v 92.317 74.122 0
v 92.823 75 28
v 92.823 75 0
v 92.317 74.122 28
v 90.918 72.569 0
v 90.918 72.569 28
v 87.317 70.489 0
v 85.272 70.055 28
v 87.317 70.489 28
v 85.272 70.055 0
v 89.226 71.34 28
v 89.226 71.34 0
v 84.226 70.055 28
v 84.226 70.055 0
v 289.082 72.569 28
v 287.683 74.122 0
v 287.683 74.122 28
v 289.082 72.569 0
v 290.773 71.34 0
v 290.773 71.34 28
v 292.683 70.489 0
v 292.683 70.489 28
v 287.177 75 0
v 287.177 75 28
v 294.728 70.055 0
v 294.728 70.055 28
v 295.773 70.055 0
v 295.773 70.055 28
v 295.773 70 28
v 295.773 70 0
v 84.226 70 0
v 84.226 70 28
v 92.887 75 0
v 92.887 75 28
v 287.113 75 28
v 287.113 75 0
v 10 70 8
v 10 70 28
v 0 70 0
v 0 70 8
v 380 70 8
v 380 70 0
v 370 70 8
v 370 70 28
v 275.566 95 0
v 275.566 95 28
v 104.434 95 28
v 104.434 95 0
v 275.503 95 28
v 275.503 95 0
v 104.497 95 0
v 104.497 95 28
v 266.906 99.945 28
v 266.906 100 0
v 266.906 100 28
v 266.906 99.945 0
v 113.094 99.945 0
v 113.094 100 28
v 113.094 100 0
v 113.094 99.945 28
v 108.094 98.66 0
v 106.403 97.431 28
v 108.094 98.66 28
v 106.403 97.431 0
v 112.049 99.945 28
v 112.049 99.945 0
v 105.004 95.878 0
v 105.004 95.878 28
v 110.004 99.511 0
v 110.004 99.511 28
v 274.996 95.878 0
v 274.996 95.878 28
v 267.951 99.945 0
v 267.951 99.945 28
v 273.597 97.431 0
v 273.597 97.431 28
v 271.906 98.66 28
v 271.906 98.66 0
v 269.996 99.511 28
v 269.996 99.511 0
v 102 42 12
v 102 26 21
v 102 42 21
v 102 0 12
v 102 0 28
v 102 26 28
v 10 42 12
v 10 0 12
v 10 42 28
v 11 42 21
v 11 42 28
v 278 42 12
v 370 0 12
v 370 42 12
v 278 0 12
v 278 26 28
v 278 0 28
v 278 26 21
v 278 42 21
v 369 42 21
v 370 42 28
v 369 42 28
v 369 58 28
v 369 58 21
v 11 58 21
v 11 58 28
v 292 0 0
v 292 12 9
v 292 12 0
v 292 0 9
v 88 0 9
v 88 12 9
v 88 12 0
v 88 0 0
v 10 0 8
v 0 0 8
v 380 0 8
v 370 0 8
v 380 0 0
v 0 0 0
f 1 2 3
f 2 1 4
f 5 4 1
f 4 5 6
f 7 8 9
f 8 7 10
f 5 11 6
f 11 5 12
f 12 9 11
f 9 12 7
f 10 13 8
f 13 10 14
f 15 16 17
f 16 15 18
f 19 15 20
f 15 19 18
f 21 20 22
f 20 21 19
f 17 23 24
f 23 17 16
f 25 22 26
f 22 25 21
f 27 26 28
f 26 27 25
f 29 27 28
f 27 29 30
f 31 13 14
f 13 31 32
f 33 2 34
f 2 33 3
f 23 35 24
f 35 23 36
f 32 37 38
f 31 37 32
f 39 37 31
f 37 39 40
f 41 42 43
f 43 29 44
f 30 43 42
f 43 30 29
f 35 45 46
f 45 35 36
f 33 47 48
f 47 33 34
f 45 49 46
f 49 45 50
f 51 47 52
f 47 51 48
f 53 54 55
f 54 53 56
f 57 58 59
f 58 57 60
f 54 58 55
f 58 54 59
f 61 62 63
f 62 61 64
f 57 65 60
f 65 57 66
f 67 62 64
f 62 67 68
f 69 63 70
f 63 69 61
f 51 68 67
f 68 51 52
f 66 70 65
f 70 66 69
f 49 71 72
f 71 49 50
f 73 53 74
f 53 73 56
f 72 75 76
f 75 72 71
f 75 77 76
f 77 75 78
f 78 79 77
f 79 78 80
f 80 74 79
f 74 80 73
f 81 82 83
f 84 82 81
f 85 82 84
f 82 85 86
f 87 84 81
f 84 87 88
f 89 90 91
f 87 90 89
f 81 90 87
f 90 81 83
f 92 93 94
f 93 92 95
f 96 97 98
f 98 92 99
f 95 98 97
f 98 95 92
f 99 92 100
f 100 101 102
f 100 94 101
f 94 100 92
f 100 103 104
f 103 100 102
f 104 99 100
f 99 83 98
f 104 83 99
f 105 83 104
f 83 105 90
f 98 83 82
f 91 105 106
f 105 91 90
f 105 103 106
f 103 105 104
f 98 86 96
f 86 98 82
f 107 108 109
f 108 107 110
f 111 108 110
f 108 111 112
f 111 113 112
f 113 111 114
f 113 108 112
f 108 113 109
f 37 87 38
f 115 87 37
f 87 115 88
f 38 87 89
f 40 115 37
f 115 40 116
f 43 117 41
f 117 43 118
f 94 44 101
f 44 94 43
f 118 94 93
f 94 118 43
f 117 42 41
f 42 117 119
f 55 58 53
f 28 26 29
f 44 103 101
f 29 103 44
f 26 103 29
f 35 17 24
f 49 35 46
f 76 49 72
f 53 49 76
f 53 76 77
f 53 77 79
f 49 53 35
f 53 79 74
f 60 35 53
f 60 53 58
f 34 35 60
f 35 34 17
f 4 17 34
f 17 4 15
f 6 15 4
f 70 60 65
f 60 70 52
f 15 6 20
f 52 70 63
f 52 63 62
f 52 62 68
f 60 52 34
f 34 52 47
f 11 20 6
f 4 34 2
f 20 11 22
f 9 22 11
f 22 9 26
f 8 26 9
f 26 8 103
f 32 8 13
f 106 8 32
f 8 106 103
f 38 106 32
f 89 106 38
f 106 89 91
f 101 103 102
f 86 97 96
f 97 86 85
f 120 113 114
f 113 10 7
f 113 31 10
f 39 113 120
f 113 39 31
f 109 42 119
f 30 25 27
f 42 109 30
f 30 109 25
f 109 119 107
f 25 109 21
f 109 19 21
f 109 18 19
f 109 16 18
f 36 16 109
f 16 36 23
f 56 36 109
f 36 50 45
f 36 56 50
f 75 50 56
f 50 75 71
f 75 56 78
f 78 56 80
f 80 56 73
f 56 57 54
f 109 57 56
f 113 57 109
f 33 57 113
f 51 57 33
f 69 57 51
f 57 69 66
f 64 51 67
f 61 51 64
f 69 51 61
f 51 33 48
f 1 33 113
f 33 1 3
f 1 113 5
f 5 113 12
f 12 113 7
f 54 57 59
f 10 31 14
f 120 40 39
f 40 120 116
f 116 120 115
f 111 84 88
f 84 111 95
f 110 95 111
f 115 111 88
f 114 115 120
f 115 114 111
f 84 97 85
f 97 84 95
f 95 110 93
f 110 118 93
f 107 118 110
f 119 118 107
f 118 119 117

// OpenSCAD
include <../src/wardrobe.scad>;
plank_yz_side_top();
//github_openscad -o wardrobe_2/plank_yz_side_top.stl -D wardrobe_n=2 -D cutting_edge=0 -D break_view_length=0 wardrobe_2/plank_yz_side_top_stl.scad
